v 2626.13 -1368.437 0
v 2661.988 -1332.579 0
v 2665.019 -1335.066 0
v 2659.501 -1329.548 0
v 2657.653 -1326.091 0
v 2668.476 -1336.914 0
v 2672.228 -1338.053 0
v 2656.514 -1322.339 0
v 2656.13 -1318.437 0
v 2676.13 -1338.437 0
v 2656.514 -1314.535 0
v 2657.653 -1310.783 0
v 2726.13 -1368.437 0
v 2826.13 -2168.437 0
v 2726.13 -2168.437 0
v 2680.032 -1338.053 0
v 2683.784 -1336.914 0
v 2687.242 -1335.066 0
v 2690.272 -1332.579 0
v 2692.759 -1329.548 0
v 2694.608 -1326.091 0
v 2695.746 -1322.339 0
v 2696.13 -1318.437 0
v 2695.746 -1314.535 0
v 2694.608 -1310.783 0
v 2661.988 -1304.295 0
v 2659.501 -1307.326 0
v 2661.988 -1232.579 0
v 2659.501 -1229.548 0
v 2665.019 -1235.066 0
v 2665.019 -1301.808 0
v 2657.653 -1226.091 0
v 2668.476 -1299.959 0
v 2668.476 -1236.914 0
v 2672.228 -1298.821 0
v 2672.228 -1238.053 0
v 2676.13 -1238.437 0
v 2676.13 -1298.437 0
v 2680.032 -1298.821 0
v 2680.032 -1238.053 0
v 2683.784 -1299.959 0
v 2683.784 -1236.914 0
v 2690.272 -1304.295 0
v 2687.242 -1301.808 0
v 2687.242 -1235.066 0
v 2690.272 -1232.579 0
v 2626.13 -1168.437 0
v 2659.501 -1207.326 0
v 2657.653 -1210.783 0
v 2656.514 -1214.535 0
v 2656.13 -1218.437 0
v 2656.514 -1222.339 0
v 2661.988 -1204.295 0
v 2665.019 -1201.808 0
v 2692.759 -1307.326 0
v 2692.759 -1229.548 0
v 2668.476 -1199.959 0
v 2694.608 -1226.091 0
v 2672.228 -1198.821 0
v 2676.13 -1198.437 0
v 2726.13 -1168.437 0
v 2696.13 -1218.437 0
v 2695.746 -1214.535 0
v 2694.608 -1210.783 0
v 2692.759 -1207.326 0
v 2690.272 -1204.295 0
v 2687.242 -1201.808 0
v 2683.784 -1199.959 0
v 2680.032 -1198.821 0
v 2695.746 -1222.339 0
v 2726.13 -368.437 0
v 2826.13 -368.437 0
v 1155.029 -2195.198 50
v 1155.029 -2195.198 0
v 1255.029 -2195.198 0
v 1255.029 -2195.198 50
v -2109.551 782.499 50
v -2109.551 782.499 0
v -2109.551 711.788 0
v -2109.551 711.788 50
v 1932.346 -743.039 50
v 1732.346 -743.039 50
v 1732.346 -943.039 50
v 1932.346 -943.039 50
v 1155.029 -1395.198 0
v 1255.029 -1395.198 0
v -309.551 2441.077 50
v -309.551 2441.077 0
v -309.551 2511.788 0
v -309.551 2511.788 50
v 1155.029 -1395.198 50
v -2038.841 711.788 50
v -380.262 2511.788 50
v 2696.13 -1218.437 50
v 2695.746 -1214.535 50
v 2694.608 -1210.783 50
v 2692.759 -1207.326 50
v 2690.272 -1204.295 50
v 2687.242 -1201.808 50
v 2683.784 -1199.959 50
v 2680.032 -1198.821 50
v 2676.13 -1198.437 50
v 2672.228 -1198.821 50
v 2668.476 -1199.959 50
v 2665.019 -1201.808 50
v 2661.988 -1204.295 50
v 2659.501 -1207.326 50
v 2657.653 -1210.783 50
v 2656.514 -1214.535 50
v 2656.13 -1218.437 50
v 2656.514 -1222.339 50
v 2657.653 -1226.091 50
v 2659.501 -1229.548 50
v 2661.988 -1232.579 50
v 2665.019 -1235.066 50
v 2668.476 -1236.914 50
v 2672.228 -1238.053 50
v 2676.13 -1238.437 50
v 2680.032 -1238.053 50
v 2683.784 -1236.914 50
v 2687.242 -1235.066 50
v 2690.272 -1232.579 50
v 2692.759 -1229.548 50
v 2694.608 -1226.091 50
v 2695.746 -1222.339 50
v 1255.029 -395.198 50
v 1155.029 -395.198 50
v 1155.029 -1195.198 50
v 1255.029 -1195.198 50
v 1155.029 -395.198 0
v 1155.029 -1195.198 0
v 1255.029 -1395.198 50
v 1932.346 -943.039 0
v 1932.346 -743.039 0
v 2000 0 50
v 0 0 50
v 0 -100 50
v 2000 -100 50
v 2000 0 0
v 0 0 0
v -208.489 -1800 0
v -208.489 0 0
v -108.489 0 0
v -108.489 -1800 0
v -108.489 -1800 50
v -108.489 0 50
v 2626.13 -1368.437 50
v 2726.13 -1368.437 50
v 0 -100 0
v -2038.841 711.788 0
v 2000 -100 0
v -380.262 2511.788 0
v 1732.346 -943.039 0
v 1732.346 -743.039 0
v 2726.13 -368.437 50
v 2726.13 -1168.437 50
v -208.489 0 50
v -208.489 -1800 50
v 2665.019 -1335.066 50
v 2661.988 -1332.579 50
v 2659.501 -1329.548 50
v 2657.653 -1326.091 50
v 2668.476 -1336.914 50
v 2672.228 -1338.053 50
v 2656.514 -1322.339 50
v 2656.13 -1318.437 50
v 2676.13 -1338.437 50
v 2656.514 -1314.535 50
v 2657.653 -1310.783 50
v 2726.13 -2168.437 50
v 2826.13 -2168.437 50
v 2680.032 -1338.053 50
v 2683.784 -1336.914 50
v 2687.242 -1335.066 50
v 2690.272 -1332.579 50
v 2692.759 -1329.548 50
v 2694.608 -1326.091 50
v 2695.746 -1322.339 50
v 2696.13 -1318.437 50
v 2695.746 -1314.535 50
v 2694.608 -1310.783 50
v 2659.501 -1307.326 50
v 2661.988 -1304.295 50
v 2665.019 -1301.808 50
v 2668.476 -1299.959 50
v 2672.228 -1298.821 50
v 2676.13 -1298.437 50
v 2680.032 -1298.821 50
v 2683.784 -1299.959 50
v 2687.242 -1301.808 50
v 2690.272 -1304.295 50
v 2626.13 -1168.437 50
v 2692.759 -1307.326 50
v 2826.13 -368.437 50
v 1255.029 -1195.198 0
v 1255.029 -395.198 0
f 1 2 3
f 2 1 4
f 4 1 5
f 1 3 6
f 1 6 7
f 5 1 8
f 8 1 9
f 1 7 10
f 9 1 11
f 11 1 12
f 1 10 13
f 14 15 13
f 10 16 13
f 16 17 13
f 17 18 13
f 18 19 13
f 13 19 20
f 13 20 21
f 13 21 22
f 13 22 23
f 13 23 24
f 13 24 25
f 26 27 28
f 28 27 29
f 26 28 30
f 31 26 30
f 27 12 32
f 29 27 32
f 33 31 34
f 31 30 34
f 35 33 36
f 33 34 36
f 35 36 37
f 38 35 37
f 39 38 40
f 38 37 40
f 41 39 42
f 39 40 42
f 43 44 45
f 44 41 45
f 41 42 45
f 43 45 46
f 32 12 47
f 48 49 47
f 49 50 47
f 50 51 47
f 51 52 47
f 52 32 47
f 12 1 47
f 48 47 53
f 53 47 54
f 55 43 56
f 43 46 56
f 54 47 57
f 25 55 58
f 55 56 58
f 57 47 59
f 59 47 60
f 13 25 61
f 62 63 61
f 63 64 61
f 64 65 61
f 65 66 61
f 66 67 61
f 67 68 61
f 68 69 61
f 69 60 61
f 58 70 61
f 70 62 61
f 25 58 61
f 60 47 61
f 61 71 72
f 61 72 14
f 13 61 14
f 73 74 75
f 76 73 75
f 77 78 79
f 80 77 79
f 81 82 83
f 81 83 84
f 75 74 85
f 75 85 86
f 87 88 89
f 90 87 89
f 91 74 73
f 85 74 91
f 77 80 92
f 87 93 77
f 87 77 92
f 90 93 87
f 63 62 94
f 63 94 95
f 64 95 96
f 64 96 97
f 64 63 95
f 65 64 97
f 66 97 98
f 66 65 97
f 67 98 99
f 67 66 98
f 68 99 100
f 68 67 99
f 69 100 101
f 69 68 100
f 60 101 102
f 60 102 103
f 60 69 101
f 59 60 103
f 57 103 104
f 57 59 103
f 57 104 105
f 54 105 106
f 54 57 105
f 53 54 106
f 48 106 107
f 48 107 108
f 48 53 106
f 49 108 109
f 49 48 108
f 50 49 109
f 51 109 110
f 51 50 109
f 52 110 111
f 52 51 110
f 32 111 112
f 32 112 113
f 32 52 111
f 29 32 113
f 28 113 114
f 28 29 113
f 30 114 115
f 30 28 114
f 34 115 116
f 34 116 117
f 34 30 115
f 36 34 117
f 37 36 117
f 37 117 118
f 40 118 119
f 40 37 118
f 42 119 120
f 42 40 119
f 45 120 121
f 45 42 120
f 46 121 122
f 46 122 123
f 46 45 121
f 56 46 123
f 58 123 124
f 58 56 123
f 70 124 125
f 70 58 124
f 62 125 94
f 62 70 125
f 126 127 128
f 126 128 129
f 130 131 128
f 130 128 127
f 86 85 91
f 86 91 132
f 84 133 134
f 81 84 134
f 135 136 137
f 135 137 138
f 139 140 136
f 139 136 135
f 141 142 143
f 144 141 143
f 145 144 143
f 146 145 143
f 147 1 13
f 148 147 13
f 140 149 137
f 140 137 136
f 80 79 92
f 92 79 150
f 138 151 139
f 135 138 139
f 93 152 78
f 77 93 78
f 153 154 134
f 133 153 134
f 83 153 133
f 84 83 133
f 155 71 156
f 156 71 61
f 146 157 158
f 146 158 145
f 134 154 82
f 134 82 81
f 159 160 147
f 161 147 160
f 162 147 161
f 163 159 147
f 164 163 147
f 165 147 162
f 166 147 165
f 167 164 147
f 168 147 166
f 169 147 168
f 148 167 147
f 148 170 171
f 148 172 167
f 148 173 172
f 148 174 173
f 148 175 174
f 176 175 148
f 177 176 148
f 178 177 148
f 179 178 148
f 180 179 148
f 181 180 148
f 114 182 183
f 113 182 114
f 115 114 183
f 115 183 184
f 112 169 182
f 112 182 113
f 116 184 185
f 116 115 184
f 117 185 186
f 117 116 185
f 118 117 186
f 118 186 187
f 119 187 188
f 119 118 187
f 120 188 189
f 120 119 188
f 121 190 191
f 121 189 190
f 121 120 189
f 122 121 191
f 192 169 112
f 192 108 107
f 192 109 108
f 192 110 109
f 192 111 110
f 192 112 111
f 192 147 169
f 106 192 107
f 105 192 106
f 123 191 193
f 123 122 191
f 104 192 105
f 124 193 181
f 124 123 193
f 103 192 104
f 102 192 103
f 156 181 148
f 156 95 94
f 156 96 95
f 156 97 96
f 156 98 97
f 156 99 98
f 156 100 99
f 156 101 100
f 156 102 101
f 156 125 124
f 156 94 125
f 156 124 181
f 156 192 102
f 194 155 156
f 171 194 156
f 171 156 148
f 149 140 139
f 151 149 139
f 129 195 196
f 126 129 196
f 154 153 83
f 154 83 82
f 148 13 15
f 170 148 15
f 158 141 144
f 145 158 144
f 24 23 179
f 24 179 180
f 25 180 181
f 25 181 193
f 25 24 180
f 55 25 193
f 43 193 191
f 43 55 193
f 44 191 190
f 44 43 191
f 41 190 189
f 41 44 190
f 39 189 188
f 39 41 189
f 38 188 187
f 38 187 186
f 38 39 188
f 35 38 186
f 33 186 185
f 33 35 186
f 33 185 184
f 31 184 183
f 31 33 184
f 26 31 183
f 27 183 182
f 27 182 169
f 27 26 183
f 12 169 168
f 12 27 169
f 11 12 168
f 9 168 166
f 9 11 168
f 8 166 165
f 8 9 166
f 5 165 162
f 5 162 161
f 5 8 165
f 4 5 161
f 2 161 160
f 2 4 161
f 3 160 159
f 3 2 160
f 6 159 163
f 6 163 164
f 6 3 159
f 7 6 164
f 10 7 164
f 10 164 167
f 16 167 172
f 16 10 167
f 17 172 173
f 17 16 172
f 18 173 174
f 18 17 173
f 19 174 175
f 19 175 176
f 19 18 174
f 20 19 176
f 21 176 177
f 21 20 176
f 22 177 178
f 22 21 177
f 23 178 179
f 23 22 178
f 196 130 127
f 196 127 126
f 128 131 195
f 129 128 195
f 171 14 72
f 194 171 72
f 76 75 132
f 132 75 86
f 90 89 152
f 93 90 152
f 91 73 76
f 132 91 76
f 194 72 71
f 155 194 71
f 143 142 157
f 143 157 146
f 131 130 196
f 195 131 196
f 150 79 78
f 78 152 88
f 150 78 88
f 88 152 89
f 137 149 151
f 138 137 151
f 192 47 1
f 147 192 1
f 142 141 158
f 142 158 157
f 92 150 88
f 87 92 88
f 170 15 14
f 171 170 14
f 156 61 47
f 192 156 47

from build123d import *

# Parameters (mm, degrees)
F0_W      = 2000
F0_H      = 100
F1_DEPTH  = 50
F2_W      = 100
F2_H      = 1800
F3_DEPTH  = 50
F4_W      = 100
F4_H      = 800
F5_DEPTH  = 50
F6_R      = 20
F7_DEPTH  = 50
F9_DEPTH  = 50
F10_W     = 200
F10_H     = 200
F11_DEPTH = 50


# Not quite as in the source:
# - a feature names something its author has since deleted; it is built from what else it names


with BuildPart() as f1:
    # F0 (on Top) → F1 (new body)
    with BuildSketch(Plane.XY):
        with Locations((1000, -50)):
            Rectangle(F0_W, F0_H)
    extrude(amount=F1_DEPTH)


with BuildPart() as f3:
    # F2 (on Top) → F3 (new body)
    with BuildSketch(Plane.XY):
        with Locations((-158.4889411926, -900)):
            Rectangle(F2_W, F2_H)
    extrude(amount=F3_DEPTH)


with BuildPart() as f5:
    # F4 (on Top) → F5 (new body)
    with BuildSketch(Plane.XY):
        with Locations((1205.0287723541, -795.1983213425)):
            Rectangle(F4_W, F4_H)
    extrude(amount=F5_DEPTH)


with BuildPart() as f5b:
    # F4 (on Top) → F5, piece 2 (new body)
    with BuildSketch(Plane.XY):
        with Locations((1205.0287723541, -1795.1983213425)):
            Rectangle(F4_W, F4_H)
    extrude(amount=F5_DEPTH)


with BuildPart() as f7:
    # F6 (on Top) → F7 (new body)
    with BuildSketch(Plane.XY):
        Polygon((2826.1301040649, -2168.4369087219), (2826.1301040649, -368.4369087219), (2726.1301040649, -368.4369087219), (2726.1301040649, -1168.4369087219), (2626.1301040649, -1168.4369087219), (2626.1301040649, -1368.4369087219), (2726.1301040649, -1368.4369087219), (2726.1301040649, -2168.4369087219), align=None)
        with Locations((2676.1301040649, -1318.4369087219)):
            Circle(F6_R, mode=Mode.SUBTRACT)
        with Locations((2676.1301040649, -1218.4369087219)):
            Circle(F6_R, mode=Mode.SUBTRACT)
    extrude(amount=F7_DEPTH)


with BuildPart() as f9:
    # F8 (on Top) → F9 (new body)
    with BuildSketch(Plane.XY):
        Polygon((-2038.8407516299, 711.787879467), (-309.5514297485, 2441.0772013484), (-309.5514297485, 2511.787879467), (-380.2621078672, 2511.787879467), (-2109.5514297485, 782.4985575857), (-2109.5514297485, 711.787879467), align=None)
    extrude(amount=F9_DEPTH)


with BuildPart() as f11:
    # F10 (on Top) → F11 (new body)
    with BuildSketch(Plane.XY):
        with Locations((1832.345867157, -843.0387616158)):
            Rectangle(F10_W, F10_H)
    extrude(amount=F11_DEPTH)


solid = Compound([f1.part, f3.part, f5.part, f5b.part, f7.part, f9.part, f11.part])
